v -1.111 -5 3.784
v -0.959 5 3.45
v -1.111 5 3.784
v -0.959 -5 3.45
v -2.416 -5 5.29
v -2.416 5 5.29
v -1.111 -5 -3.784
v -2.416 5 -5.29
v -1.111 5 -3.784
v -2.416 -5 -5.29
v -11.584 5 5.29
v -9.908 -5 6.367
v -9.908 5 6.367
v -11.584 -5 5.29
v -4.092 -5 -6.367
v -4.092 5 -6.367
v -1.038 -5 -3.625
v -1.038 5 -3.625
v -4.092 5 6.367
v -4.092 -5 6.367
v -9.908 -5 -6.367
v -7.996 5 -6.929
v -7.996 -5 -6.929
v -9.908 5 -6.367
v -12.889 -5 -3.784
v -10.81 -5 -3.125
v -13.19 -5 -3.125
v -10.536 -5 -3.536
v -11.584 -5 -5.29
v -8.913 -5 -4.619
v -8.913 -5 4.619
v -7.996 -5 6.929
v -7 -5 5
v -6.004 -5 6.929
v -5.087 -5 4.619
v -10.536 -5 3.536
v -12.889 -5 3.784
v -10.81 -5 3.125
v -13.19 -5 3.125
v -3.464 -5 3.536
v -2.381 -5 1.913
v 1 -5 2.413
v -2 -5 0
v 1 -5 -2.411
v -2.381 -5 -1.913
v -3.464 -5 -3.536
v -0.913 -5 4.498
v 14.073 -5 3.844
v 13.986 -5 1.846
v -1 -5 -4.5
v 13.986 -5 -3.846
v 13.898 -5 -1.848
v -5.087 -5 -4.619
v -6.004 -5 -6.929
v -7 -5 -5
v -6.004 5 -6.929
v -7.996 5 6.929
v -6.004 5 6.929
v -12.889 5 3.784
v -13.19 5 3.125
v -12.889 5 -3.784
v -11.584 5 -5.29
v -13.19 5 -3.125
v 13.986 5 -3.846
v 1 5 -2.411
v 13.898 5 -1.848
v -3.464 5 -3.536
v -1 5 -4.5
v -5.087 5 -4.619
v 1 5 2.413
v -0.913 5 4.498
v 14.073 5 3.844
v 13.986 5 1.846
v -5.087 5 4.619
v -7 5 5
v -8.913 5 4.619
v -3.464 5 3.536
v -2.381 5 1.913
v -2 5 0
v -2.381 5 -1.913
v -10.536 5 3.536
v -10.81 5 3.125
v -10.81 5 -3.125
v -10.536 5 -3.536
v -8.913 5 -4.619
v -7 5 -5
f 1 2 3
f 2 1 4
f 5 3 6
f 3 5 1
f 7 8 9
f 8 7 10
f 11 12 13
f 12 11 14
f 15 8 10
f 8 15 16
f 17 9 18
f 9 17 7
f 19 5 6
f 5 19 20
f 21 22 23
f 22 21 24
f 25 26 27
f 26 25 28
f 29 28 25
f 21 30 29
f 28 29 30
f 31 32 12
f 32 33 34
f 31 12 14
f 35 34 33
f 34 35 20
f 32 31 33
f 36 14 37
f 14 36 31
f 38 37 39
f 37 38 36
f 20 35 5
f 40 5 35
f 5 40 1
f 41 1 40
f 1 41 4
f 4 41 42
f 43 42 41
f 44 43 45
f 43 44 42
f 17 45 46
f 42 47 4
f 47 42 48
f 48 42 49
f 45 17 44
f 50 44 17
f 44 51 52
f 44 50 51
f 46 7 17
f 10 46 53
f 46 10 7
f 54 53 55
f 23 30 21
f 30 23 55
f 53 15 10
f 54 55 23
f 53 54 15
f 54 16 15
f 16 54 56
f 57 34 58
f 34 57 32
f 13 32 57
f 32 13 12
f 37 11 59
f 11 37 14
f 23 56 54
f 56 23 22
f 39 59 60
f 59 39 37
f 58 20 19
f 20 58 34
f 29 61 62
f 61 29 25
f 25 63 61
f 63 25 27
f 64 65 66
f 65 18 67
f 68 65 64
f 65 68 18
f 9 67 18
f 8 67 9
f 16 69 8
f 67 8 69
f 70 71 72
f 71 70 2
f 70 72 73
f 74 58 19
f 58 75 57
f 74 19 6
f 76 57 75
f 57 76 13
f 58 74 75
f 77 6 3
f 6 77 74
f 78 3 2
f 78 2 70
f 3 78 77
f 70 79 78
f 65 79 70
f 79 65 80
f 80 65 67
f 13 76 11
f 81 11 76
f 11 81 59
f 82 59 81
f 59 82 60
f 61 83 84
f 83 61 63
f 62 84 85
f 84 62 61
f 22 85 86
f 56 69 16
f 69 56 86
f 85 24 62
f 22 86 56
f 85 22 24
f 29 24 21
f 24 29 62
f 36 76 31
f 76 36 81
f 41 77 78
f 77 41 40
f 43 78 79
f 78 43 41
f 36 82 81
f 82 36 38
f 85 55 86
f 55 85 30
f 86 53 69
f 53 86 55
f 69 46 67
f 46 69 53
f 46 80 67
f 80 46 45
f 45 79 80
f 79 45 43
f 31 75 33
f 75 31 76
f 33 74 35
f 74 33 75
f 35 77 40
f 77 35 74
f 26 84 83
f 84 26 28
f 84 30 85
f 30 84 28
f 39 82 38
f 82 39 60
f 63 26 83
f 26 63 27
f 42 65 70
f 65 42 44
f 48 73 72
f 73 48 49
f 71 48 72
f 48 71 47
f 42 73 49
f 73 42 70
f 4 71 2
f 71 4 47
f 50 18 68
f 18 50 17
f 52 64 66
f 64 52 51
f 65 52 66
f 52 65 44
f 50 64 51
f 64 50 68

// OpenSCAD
//Thickness of the Notebook
thickness = 5;

//Pencil Diamater
penD = 8;

//Pen Radius
penrad=(penD+2)/2;

//Depth of the part
depth = 10; // [5:20]

//Wall Thickness
wlthk = 2; //[2:5]

//How angled the edges are
angle = 2.5; // [1:10]


//Modeled by Eugene Pentland
//Creates the center most rectangle
cube([wlthk,depth,thickness],true);

translate([-wlthk/2,-depth/2,(thickness/2)]){
    rotate(a=angle,v=[0,1,0])
    cube([15,depth,wlthk],false);
}

//Creates the bottom tab
translate([-wlthk/2,-depth/2,(-thickness/2)-wlthk]){
    rotate(a=-angle,v=[0,1,0])
    cube([15,depth,wlthk],false);
}

translate([-penrad-wlthk,0,0]){
    rotate(a=90,v=[1,0,0]){
        difference(){
            //Creates the initial cylinder for the pen
            cylinder(depth,penrad+wlthk,penrad+wlthk,true);
            
            //Cuts out the inner cylinder for the pen
            cylinder(depth+2,penrad,penrad,true);
        
            //Creates gap to slide the pen/pencil in
            translate([-penrad,0,0]){
                rotate(a=-90,v=[1,0,0])
            cube([penrad*3,depth+2,penrad*1.25],true);

                                    }
                    }
}
}
